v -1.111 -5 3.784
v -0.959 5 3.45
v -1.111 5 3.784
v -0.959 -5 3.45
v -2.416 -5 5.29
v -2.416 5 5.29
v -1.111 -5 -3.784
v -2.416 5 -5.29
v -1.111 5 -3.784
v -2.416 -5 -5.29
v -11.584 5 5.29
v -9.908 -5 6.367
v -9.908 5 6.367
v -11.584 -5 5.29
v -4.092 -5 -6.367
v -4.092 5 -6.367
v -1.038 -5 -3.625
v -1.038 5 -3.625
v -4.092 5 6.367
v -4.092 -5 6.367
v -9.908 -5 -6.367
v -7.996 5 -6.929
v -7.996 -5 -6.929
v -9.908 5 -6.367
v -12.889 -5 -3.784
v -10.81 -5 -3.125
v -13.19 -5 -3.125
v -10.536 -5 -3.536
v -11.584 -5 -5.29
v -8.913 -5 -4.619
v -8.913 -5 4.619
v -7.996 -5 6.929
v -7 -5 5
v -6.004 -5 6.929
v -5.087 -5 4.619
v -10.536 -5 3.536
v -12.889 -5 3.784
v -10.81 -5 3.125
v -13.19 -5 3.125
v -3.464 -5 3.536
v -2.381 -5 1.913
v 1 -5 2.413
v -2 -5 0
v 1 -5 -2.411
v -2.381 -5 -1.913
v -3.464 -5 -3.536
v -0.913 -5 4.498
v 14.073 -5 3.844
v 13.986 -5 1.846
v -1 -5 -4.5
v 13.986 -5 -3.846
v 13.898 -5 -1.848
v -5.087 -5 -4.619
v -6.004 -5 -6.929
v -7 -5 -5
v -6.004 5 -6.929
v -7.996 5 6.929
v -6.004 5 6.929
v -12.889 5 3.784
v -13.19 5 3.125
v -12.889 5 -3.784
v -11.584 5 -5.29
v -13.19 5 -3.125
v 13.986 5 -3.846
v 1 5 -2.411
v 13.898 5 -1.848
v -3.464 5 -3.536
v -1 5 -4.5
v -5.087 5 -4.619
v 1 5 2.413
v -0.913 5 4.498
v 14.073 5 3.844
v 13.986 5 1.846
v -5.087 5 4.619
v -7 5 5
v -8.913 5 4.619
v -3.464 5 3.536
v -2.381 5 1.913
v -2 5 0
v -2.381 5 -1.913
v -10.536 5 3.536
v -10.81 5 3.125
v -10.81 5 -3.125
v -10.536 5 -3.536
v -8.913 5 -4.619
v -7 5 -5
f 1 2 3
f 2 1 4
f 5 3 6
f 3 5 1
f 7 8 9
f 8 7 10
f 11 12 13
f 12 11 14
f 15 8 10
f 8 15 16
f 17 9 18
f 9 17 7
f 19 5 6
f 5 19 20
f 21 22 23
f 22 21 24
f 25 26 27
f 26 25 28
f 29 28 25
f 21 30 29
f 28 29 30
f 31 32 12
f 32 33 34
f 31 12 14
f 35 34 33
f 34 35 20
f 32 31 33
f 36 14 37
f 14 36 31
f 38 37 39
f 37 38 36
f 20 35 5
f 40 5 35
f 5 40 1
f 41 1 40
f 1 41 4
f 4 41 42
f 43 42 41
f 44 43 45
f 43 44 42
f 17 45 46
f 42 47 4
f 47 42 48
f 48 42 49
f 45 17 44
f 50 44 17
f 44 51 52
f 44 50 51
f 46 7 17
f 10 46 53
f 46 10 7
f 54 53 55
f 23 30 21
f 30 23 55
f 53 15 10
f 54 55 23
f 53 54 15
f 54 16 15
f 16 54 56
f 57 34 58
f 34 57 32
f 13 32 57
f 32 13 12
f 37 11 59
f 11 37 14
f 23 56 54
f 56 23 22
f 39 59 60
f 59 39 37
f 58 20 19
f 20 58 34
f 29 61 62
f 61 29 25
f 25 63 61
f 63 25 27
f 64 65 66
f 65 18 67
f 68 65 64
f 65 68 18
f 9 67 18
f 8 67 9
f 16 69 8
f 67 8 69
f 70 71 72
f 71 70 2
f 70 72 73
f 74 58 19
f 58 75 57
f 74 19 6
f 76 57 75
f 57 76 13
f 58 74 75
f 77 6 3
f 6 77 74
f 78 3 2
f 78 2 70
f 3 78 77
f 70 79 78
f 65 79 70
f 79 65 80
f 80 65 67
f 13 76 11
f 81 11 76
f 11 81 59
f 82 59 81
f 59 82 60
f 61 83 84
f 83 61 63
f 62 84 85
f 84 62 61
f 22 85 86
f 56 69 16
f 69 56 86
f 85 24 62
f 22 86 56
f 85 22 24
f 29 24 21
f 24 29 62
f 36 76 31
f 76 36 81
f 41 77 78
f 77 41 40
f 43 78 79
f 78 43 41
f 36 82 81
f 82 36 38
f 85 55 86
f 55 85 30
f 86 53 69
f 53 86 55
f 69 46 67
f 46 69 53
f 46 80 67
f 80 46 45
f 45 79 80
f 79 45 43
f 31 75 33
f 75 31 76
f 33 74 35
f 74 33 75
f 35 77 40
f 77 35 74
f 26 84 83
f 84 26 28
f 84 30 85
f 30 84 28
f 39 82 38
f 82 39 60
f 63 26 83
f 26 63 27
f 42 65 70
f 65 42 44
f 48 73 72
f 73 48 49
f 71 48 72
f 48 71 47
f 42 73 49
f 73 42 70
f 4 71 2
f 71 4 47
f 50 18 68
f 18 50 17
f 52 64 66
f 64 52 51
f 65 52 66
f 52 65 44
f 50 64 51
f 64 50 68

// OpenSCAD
//Thickness of the Notebook
thickness = 5;

//Pencil Diamater
penD = 8;

//Pen Radius
penrad=(penD+2)/2;

//Depth of the part
depth = 10; // [5:20]

//Wall Thickness
wlthk = 2; //[2:5]

//How angled the edges are
angle = 2.5; // [1:10]


//Modeled by Eugene Pentland
//Creates the center most rectangle
cube([wlthk,depth,thickness],true);

translate([-wlthk/2,-depth/2,(thickness/2)]){
    rotate(a=angle,v=[0,1,0])
    cube([15,depth,wlthk],false);
}

//Creates the bottom tab
translate([-wlthk/2,-depth/2,(-thickness/2)-wlthk]){
    rotate(a=-angle,v=[0,1,0])
    cube([15,depth,wlthk],false);
}

translate([-penrad-wlthk,0,0]){
    rotate(a=90,v=[1,0,0]){
        difference(){
            //Creates the initial cylinder for the pen
            cylinder(depth,penrad+wlthk,penrad+wlthk,true);
            
            //Cuts out the inner cylinder for the pen
            cylinder(depth+2,penrad,penrad,true);
        
            //Creates gap to slide the pen/pencil in
            translate([-penrad,0,0]){
                rotate(a=-90,v=[1,0,0])
            cube([penrad*3,depth+2,penrad*1.25],true);

                                    }
                    }
}
}
